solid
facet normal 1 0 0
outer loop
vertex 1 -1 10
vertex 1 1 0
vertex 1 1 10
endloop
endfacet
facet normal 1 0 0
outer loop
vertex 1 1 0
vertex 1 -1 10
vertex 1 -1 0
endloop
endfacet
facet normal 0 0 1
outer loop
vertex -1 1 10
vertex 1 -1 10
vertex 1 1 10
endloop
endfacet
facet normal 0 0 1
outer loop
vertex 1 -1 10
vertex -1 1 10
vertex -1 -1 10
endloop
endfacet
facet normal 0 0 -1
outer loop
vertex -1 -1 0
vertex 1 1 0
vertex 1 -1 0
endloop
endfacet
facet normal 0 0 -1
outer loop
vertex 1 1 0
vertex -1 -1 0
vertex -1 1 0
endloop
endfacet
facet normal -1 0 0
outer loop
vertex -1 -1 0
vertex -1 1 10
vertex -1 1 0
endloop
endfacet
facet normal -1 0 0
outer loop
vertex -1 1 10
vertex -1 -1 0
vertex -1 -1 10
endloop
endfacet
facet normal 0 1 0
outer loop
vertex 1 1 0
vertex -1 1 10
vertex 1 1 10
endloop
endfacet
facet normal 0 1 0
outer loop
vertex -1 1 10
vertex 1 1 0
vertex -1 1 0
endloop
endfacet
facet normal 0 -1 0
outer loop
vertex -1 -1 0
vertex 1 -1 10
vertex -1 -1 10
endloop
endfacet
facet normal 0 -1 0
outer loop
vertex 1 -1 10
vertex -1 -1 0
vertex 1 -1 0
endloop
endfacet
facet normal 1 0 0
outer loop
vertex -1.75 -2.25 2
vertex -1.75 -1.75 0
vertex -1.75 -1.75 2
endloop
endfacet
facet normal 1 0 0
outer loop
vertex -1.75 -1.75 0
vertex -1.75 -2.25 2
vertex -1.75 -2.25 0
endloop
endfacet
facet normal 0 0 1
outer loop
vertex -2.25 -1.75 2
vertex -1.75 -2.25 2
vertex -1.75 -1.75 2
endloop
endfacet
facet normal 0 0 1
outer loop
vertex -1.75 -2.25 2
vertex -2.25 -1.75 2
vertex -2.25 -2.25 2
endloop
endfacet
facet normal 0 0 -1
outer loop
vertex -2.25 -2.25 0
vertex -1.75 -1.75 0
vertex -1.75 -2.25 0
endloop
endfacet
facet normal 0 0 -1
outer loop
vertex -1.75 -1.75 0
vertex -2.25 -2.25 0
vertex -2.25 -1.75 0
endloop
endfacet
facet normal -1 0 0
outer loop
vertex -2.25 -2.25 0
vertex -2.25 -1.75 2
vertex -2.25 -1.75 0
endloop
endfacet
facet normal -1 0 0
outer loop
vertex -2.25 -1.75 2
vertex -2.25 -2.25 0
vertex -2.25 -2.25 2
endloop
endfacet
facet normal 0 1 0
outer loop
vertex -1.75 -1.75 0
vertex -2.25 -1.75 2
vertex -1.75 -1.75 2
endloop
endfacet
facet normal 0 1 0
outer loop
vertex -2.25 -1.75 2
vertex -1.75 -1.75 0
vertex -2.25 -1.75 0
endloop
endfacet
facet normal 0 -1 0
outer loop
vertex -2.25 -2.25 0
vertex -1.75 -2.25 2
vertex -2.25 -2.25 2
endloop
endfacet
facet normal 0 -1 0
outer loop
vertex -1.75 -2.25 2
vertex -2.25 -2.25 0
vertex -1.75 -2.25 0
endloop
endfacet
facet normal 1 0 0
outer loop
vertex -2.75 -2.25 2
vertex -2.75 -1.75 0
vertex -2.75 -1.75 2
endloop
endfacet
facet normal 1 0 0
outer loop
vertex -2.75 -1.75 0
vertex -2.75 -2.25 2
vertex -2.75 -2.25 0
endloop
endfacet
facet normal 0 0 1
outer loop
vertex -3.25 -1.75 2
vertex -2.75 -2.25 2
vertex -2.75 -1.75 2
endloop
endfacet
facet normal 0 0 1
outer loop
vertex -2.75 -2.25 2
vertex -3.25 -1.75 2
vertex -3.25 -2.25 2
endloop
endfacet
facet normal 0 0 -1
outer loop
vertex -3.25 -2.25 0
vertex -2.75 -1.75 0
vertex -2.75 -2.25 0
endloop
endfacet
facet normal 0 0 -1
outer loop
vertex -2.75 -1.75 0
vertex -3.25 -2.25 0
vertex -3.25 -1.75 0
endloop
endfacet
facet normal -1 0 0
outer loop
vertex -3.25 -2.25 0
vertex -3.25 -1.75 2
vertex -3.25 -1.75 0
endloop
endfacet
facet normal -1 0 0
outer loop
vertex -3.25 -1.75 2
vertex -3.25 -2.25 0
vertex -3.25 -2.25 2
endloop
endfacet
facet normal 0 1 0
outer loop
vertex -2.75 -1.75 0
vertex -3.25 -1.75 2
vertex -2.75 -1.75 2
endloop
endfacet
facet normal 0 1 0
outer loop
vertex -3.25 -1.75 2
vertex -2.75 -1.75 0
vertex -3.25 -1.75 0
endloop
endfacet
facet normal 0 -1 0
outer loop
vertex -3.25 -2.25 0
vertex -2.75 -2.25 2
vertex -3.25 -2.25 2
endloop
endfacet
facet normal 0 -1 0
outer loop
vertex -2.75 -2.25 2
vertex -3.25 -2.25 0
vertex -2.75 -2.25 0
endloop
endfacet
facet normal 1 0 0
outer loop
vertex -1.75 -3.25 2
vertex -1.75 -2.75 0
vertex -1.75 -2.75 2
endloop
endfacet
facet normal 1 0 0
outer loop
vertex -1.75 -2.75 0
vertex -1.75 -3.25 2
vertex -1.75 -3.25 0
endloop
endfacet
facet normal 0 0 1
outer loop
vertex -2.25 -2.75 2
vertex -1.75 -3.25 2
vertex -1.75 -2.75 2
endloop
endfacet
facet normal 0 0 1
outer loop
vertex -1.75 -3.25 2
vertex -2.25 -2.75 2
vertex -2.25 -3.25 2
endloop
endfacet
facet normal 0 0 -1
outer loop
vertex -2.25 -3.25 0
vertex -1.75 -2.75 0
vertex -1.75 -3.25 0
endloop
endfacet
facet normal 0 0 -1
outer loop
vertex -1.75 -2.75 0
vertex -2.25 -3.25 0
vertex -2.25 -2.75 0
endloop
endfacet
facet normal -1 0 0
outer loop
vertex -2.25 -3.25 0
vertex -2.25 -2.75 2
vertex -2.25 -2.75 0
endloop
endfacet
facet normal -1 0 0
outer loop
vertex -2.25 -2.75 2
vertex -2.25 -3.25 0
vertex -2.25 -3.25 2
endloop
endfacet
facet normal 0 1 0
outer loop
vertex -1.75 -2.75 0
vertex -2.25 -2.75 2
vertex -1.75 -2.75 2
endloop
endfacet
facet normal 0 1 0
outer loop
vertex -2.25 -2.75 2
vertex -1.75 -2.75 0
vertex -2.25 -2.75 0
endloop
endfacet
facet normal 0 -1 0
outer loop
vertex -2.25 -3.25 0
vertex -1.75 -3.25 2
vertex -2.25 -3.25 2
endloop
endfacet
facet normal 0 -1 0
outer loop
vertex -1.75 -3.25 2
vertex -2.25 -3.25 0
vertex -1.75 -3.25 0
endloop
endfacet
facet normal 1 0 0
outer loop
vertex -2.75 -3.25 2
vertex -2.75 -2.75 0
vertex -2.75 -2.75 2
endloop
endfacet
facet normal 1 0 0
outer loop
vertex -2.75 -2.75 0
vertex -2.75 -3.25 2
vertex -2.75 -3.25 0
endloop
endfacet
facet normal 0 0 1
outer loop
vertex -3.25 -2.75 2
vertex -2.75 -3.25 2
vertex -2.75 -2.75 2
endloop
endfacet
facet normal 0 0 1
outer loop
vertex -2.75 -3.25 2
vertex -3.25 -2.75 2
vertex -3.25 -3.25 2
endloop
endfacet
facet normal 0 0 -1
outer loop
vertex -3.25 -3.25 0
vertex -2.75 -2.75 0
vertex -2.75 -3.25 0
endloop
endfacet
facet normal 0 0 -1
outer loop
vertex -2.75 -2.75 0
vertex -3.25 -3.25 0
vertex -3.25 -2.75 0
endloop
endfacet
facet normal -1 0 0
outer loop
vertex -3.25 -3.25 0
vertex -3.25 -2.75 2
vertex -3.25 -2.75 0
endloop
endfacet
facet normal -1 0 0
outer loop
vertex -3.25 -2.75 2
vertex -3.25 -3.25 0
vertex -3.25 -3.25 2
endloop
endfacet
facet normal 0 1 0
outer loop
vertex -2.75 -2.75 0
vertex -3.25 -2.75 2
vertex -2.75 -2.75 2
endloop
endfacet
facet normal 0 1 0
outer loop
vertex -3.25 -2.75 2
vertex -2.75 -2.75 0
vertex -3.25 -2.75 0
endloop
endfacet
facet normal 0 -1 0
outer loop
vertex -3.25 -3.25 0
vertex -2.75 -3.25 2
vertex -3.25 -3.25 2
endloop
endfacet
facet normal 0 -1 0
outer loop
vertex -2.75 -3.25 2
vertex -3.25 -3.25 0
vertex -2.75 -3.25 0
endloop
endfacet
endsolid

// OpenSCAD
translate([0, 0, 5]) color([0,1,0,0.9]) cube([2, 2, 10], center=true);
translate([-2.0, -2.0, 1]) color([1,0,0]) cube([0.5, 0.5, 2], center=true);
translate([-3.0, -2.0, 1]) color([1,0,0]) cube([0.5, 0.5, 2], center=true);
translate([-2.0, -3.0, 1]) color([1,0,0]) cube([0.5, 0.5, 2], center=true);
translate([-3.0, -3.0, 1]) color([1,0,0]) cube([0.5, 0.5, 2], center=true);
